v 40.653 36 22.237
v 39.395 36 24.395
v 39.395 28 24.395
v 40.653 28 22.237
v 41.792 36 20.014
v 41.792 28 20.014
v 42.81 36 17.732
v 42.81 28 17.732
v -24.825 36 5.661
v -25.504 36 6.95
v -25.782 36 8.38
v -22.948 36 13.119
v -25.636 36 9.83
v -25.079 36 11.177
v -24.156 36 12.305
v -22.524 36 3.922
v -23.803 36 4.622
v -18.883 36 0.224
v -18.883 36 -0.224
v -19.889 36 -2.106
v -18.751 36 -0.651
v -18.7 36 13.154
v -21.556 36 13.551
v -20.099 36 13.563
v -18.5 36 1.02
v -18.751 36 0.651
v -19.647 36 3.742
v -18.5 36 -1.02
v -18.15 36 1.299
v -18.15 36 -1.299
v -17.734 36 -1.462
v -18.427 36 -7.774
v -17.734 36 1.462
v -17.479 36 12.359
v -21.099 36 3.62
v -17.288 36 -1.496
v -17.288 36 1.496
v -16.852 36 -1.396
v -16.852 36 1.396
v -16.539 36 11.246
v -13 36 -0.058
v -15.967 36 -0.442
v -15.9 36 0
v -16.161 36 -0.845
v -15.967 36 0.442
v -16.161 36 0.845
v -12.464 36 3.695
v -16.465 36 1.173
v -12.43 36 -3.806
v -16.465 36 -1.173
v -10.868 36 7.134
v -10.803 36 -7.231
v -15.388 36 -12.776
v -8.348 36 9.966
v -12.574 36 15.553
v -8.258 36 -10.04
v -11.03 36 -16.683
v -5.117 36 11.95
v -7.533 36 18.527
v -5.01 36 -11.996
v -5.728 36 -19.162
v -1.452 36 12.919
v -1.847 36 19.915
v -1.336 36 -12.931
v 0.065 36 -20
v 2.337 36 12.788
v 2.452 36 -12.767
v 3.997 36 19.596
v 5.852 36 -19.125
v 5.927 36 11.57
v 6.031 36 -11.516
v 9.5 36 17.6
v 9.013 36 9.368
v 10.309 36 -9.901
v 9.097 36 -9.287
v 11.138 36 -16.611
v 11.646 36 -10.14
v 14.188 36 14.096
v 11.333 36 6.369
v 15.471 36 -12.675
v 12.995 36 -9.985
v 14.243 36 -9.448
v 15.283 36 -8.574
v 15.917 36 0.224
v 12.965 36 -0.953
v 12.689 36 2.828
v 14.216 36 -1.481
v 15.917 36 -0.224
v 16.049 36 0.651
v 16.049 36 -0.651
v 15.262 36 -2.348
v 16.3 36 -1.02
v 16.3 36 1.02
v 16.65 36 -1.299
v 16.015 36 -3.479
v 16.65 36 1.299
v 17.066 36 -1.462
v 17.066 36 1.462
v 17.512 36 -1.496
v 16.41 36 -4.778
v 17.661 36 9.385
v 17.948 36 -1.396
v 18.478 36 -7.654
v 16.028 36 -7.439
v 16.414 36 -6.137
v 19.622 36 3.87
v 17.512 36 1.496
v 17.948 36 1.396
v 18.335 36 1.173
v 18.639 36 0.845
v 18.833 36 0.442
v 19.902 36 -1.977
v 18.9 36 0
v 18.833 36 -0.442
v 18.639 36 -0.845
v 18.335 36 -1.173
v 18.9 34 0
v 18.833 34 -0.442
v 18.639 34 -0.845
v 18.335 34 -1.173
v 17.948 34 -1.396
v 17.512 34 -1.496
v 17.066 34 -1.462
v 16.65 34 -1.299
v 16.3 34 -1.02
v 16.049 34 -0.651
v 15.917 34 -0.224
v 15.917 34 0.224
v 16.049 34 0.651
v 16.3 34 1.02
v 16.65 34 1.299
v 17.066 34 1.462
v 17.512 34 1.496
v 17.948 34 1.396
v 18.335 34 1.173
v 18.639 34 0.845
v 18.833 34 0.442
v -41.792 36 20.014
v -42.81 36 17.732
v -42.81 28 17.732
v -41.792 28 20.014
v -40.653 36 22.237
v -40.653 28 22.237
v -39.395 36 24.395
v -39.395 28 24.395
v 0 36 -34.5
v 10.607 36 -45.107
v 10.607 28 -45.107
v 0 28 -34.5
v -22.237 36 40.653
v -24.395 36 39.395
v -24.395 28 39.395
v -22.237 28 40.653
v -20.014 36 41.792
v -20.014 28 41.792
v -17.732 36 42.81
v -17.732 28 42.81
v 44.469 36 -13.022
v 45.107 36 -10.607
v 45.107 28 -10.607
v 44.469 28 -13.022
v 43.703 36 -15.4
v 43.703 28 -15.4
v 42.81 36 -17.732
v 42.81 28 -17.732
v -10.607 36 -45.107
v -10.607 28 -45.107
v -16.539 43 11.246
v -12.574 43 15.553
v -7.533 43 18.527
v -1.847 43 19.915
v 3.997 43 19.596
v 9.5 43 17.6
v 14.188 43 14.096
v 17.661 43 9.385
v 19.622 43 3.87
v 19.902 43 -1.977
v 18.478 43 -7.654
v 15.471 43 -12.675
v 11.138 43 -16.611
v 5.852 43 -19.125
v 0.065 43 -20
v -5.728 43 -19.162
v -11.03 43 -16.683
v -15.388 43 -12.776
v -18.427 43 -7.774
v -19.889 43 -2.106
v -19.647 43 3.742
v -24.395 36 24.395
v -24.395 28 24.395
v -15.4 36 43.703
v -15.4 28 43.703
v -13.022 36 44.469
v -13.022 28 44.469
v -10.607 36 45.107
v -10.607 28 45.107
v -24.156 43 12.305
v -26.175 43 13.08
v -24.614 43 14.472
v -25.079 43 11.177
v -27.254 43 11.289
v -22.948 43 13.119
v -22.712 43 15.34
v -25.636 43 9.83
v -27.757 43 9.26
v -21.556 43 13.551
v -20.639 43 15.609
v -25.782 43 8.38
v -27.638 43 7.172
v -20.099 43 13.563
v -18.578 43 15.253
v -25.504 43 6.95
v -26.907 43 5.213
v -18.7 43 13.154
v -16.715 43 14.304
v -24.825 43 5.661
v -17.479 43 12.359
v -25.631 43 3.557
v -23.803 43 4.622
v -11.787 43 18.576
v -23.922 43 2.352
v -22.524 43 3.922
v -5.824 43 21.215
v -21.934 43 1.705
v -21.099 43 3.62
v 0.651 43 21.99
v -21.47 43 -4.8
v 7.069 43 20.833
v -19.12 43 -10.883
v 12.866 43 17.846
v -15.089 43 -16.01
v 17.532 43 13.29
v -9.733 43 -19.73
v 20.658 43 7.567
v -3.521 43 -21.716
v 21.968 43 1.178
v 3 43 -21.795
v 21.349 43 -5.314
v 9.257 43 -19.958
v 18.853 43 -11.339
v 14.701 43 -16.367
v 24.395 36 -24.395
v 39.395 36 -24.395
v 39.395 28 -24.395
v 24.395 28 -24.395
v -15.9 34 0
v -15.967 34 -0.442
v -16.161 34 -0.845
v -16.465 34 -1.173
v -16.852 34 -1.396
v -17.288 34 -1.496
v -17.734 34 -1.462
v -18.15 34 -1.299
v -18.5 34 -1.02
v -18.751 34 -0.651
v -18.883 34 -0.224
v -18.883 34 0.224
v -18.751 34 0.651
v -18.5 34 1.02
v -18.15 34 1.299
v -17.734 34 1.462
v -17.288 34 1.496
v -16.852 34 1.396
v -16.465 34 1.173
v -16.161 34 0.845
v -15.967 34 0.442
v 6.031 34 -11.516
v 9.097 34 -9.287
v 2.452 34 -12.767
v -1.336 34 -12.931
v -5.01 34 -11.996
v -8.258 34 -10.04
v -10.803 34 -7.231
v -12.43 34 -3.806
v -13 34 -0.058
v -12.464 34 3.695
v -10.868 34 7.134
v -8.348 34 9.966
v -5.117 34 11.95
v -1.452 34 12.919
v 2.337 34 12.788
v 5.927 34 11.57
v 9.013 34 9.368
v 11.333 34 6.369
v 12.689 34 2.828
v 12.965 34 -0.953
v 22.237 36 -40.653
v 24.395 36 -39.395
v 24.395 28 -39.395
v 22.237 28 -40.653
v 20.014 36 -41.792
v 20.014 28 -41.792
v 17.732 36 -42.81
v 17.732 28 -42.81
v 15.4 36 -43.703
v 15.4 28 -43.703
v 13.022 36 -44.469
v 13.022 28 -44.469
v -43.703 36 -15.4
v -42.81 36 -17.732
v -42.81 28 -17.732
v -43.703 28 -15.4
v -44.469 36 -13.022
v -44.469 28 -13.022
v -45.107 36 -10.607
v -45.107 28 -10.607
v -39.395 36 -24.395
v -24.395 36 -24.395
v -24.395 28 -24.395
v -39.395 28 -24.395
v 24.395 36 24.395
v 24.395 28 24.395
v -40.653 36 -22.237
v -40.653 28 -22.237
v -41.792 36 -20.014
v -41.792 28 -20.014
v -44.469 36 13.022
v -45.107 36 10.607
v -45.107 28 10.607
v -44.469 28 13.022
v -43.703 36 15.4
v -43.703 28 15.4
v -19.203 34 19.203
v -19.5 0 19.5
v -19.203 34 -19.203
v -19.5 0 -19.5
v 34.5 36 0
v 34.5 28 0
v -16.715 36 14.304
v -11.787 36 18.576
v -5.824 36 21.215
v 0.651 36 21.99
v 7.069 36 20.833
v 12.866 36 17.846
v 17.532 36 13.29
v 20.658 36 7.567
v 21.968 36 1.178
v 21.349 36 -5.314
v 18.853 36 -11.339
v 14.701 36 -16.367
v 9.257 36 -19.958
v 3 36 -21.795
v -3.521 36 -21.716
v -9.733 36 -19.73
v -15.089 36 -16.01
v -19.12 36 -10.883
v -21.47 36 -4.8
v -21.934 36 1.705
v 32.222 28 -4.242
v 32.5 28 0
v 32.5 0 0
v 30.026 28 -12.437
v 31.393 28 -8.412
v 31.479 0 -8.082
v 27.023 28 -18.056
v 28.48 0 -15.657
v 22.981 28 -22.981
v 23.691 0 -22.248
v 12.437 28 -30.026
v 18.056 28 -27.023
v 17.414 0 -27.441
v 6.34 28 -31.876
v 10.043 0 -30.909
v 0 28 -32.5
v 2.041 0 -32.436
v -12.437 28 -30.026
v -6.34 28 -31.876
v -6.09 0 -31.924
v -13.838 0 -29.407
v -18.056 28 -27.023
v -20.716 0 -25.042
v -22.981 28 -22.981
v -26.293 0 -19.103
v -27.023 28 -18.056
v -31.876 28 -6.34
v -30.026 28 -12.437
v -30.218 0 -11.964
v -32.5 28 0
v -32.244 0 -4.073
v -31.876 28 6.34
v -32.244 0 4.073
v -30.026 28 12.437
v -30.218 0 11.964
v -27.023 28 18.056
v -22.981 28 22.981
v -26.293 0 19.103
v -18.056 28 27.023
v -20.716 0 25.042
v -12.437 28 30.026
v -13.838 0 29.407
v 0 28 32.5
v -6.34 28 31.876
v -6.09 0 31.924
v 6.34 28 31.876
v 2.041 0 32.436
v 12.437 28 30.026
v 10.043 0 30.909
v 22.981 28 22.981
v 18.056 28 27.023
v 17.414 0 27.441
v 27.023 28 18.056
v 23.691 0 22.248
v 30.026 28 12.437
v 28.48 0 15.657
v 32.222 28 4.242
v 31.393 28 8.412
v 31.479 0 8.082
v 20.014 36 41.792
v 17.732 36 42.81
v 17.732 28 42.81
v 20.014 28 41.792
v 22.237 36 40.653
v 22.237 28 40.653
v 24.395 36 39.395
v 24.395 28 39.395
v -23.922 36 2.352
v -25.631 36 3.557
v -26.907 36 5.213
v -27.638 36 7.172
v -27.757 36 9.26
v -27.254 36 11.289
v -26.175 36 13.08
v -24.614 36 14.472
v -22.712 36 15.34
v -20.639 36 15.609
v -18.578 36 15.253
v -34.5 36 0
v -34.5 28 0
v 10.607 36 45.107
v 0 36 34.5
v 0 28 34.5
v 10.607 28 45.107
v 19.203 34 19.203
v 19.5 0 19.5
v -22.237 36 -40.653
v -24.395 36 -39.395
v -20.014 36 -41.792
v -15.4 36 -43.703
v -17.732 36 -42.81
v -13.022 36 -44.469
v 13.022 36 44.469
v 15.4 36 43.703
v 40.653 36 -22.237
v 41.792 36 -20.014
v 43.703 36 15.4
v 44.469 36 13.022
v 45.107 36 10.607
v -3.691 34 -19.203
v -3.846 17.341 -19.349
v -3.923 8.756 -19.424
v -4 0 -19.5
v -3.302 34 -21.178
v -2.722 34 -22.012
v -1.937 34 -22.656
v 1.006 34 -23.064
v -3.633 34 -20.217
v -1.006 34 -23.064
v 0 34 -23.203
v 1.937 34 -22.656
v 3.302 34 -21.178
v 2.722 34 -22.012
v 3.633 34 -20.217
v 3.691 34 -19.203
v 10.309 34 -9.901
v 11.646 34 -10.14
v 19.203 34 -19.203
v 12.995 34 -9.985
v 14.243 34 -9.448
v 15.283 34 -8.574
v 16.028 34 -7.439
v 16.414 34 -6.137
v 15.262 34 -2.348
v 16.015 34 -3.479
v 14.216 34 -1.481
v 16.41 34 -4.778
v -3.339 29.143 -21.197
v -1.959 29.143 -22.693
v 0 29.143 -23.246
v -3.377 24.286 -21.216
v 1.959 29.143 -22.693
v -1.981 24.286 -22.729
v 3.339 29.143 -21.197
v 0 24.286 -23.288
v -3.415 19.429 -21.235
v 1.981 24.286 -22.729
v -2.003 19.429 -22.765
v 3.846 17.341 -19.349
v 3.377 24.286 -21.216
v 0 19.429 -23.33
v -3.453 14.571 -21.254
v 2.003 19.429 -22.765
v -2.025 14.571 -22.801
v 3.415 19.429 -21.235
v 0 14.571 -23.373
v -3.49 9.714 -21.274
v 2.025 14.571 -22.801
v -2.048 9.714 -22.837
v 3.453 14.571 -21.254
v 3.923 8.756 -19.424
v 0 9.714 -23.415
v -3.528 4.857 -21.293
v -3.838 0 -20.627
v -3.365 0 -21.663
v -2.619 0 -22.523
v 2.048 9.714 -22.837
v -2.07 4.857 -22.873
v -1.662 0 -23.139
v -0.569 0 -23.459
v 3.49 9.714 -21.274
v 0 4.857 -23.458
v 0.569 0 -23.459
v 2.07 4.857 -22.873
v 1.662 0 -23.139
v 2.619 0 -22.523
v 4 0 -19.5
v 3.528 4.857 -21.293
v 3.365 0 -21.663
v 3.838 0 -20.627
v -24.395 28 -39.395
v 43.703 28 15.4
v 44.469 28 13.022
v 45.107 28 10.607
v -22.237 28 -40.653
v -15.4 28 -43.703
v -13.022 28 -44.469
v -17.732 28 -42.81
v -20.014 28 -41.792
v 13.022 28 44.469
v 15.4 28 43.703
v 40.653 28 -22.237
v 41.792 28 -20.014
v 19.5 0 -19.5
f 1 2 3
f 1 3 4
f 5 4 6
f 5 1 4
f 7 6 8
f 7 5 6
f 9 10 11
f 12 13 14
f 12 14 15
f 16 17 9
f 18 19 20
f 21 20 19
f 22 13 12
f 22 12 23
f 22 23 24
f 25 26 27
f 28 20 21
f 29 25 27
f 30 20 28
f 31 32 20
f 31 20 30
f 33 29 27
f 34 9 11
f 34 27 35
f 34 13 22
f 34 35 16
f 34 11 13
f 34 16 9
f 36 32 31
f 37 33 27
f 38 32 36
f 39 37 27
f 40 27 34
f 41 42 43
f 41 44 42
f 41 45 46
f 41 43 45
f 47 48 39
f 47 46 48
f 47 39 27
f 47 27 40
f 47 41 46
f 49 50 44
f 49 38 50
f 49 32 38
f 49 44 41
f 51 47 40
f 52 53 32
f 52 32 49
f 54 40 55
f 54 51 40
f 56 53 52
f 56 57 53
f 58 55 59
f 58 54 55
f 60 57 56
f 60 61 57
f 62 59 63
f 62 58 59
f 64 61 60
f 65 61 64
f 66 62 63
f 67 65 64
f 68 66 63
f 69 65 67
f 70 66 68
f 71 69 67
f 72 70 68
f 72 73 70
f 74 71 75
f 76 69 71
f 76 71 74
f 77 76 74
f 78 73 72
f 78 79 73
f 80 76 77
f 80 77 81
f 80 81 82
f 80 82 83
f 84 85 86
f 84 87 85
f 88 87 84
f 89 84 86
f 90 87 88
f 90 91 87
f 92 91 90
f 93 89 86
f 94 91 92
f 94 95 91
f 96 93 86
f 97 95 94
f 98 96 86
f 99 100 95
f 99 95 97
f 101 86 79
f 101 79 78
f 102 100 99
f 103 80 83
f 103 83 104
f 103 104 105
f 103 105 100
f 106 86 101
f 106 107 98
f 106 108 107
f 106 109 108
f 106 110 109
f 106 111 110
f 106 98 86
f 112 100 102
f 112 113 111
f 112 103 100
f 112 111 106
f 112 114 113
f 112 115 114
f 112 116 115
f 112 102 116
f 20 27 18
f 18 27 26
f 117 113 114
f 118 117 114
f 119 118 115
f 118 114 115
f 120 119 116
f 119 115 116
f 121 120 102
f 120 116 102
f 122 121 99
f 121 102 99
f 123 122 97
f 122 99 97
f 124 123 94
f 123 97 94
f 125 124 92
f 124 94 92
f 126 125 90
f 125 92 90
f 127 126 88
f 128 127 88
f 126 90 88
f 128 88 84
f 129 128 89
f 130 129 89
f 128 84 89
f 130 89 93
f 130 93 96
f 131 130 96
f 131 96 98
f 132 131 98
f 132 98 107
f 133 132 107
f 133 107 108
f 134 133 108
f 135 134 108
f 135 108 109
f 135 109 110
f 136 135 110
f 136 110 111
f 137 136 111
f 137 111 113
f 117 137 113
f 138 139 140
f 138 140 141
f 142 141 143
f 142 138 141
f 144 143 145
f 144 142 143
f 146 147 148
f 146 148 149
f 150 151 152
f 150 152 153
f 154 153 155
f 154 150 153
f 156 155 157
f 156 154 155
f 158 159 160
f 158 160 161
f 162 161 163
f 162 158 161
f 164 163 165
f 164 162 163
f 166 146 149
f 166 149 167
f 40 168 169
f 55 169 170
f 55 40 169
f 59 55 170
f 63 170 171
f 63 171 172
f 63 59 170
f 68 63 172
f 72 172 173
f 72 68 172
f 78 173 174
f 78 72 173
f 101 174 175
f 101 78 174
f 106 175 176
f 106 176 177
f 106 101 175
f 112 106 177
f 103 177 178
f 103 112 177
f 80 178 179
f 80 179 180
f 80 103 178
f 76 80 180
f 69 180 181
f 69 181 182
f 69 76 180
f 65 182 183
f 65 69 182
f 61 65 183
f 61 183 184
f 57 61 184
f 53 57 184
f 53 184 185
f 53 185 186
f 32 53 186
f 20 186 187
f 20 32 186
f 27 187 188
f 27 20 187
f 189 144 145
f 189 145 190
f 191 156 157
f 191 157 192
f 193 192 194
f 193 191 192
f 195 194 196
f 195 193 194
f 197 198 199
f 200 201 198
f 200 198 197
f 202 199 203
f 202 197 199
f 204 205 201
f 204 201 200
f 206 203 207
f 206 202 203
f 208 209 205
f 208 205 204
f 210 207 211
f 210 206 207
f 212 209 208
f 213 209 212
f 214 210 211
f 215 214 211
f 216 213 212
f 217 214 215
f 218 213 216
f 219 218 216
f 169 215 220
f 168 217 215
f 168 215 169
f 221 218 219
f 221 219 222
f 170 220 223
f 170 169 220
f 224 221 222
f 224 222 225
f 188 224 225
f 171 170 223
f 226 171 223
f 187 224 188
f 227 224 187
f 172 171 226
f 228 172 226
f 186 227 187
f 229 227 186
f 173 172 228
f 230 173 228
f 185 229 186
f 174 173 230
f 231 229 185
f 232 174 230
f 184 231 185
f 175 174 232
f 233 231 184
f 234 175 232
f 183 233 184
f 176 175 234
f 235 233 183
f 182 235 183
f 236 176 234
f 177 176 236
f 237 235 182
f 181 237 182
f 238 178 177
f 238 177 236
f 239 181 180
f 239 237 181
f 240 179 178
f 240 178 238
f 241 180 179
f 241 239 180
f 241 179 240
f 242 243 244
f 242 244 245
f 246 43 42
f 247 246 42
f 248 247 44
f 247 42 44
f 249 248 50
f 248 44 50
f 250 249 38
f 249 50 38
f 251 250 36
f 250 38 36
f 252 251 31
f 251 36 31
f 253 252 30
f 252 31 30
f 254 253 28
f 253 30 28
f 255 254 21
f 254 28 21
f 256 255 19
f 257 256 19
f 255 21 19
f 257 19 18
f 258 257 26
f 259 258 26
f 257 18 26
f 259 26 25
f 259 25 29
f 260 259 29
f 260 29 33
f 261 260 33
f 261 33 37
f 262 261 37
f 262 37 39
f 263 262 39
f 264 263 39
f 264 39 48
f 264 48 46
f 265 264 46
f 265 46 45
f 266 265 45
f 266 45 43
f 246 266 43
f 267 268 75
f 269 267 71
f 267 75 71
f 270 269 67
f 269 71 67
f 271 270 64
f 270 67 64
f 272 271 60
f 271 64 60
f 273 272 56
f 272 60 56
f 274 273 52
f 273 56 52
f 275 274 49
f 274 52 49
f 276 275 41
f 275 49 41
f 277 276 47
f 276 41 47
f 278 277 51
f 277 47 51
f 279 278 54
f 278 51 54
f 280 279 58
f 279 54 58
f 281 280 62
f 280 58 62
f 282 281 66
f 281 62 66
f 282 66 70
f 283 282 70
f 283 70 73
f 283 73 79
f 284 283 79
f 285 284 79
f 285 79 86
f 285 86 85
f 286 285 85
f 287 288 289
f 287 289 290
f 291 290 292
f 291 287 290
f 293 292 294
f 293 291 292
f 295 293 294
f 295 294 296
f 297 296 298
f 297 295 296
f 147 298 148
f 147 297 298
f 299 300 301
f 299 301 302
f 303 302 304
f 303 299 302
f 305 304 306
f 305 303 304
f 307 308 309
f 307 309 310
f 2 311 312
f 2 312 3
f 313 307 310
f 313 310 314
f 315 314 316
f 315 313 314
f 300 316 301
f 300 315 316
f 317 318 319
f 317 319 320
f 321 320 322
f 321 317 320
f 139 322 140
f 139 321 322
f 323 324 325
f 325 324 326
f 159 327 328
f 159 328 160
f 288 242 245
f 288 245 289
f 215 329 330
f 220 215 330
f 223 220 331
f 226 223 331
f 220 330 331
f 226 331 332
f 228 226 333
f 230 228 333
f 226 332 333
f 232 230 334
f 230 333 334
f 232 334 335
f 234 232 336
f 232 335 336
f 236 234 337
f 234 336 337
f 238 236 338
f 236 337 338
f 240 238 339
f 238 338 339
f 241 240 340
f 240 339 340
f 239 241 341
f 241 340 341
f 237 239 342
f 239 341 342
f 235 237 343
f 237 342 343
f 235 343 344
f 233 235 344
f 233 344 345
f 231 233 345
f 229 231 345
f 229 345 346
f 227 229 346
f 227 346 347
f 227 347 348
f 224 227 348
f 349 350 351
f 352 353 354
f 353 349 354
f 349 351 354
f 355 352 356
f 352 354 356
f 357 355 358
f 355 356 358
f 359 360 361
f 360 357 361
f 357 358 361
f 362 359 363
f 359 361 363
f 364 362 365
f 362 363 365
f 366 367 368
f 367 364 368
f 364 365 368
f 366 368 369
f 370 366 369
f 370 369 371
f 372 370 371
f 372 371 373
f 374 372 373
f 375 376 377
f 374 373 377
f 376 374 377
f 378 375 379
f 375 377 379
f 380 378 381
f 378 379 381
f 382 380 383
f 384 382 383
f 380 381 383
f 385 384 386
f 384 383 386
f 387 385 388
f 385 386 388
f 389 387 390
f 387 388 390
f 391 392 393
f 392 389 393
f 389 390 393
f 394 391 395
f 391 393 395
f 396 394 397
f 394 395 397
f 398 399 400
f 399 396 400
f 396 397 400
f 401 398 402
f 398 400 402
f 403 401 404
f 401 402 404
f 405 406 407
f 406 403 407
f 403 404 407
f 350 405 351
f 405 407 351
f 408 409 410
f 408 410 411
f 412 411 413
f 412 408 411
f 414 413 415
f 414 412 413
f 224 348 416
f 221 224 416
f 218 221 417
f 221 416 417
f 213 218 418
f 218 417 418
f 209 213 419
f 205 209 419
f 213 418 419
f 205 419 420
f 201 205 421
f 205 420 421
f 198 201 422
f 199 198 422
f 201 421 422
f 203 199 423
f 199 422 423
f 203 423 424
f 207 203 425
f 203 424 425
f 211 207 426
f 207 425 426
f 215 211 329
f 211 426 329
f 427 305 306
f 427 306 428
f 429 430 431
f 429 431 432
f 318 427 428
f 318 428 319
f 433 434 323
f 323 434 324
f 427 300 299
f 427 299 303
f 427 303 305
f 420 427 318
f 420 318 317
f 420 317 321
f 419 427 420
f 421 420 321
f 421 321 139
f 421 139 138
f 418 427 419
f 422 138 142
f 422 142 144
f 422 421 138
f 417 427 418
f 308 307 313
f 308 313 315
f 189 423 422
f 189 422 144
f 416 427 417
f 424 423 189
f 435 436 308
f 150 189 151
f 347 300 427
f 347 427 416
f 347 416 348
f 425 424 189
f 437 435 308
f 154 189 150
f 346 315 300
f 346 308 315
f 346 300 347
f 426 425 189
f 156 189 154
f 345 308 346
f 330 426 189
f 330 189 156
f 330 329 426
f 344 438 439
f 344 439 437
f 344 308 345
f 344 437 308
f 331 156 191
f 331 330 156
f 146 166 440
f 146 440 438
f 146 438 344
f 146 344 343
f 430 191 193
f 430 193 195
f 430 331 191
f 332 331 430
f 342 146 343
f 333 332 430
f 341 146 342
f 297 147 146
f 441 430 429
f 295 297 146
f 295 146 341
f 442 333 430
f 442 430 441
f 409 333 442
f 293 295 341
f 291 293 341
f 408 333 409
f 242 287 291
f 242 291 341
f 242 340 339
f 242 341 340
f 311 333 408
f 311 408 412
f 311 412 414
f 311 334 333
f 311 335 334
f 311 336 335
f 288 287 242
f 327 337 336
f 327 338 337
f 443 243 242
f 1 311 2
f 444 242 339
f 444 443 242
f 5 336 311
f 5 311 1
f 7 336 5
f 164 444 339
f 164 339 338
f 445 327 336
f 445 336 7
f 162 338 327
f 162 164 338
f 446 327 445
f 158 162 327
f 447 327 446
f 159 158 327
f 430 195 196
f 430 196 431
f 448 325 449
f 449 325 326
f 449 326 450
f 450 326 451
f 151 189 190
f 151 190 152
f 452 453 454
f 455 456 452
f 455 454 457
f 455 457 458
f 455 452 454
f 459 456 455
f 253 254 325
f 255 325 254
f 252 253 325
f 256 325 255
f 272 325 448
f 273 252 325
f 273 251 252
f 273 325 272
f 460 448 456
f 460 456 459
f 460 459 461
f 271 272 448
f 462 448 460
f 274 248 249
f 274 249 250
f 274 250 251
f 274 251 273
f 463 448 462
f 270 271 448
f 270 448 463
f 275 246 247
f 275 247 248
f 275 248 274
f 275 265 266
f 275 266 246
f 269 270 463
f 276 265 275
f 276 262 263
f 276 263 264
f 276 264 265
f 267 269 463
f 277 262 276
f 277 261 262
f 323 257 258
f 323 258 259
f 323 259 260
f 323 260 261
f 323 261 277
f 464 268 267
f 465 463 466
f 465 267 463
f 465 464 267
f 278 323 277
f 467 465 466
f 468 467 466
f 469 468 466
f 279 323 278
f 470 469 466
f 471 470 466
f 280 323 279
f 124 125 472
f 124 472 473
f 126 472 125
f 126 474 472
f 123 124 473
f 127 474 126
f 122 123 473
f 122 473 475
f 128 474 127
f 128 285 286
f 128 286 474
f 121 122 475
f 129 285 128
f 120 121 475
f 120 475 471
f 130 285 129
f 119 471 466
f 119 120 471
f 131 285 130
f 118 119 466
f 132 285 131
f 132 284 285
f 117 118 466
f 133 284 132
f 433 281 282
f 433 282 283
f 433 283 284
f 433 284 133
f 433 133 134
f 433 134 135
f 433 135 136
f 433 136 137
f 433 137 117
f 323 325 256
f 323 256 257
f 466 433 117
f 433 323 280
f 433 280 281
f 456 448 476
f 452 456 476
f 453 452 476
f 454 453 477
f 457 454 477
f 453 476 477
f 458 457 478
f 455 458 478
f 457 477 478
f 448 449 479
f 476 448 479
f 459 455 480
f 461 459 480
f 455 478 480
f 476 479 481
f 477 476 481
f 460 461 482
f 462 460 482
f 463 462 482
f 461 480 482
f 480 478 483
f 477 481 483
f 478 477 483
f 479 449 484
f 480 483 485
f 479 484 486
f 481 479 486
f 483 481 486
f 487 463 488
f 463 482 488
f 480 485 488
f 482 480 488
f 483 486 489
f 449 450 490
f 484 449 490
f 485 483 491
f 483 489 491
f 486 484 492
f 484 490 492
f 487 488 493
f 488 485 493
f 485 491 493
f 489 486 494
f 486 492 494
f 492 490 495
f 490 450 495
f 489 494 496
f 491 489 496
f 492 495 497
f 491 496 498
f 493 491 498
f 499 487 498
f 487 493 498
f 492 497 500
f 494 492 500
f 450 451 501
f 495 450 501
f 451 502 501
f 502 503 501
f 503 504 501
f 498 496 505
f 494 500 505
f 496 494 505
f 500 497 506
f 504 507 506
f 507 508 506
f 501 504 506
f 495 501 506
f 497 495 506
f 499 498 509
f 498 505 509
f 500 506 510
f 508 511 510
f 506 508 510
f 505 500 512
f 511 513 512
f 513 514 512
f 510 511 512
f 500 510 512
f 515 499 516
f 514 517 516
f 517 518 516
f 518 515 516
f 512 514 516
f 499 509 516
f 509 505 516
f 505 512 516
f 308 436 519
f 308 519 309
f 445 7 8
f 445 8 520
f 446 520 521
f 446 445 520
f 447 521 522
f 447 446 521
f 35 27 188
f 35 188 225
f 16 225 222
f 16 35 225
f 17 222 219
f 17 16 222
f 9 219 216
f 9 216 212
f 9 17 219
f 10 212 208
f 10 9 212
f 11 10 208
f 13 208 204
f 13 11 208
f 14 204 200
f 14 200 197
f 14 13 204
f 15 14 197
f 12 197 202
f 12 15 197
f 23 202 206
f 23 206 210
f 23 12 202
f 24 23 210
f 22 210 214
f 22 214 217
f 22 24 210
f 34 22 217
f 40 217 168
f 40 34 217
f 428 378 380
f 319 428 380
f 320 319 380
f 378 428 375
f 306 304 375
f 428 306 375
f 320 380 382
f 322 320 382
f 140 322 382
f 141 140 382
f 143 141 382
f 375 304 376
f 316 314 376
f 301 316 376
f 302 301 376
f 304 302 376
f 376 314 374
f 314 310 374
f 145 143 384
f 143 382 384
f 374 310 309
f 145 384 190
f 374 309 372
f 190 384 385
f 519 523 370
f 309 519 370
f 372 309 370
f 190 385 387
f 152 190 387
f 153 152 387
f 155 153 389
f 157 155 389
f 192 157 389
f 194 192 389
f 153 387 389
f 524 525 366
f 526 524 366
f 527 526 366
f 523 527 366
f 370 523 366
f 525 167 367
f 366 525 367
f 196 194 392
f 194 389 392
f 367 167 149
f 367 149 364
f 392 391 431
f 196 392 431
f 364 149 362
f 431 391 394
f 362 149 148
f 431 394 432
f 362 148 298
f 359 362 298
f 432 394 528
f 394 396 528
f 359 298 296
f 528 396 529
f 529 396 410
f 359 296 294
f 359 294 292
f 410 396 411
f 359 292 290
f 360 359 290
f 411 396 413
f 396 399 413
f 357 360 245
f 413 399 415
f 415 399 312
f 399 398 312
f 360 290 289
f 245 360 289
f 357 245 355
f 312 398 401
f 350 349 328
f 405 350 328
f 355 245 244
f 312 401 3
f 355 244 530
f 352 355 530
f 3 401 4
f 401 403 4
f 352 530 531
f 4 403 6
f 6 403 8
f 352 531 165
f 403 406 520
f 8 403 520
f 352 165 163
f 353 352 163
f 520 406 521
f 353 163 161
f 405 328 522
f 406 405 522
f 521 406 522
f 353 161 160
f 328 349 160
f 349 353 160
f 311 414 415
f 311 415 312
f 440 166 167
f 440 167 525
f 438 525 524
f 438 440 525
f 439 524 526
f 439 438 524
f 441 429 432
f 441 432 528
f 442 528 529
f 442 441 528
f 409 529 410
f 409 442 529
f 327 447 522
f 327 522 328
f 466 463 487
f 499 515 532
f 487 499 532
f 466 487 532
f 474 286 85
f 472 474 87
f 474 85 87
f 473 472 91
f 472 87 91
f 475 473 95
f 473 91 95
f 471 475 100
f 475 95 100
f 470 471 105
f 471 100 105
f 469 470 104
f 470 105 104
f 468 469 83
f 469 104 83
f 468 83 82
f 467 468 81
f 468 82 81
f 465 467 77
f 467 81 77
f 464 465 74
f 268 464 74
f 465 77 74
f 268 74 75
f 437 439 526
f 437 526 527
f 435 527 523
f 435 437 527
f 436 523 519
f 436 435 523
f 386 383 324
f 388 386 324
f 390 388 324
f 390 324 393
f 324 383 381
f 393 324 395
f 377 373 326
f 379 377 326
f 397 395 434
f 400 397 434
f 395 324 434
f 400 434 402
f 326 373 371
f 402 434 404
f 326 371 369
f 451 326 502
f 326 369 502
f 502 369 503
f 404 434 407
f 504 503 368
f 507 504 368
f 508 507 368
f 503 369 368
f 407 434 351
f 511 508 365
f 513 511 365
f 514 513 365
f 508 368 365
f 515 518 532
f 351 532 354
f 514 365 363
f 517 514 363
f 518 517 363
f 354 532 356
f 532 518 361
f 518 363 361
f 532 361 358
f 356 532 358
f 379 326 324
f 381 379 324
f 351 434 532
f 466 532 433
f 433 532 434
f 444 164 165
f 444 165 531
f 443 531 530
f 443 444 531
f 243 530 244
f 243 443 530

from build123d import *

# Parameters (mm, degrees)
SKETCH3_R           = 1.5
CUT_EXTRUDE1_DEPTH  = 20
BOSS_EXTRUDE2_START = 36
BOSS_EXTRUDE2_DEPTH = 8
CIRPATTERN1_COUNT   = 8
SKETCH5_R           = 4.669864721
CUT_EXTRUDE2_DEPTH  = 37
CUT_EXTRUDE4_DEPTH  = 34
CUT_EXTRUDE4_DRAFT  = -0.5
BOSS_EXTRUDE3_DEPTH = 7


with BuildPart() as part:
    # Sketch2 → Revolve1 (revolve)
    with BuildSketch(Plane.XY):
        Polygon((13, 0), (13, 36), (22.5, 36), (32.5, 36), (32.5, 0), align=None)
    revolve(axis=Axis((0, 0, 0), (0, 1, 0)))

    # Sketch3 → Cut-Extrude1 (cut)
    with BuildSketch(Plane(origin=(0, 36, 0), x_dir=(1, 0, 0), z_dir=(0, 1, 0))):
        with Locations((-17.4, 0)):
            Circle(SKETCH3_R)
        with Locations((17.4, 0)):
            Circle(SKETCH3_R)
    extrude(amount=-CUT_EXTRUDE1_DEPTH, mode=Mode.SUBTRACT)

    # Sketch4 → Boss-Extrude2 (add)
    with BuildSketch(Plane(origin=(0, 0, 0), x_dir=(1, 0, 0), z_dir=(0, 1, 0)).offset(BOSS_EXTRUDE2_START)):
        with BuildLine():
            Line((0, 34.5), (-10.606601718, 45.106601718))
            ThreePointArc((-10.606601718, 45.106601718), (-14.215943039, 44.102295655), (-17.732352445, 42.809685765))
            Line((-17.732352445, 42.809685765), (-12.437211552, 30.026084807))
            ThreePointArc((-12.437211552, 30.026084807), (0, 32.5), (12.437211552, 30.026084807))
            Line((12.437211552, 30.026084807), (17.732352445, 42.809685765))
            ThreePointArc((17.732352445, 42.809685765), (14.215943039, 44.102295655), (10.606601718, 45.106601718))
            Line((10.606601718, 45.106601718), (0, 34.5))
        make_face()
    boss_extrude2 = extrude(amount=-BOSS_EXTRUDE2_DEPTH)

    # CirPattern1: Boss-Extrude2 ×8 about axis
    cirpattern1_axis = Axis((0, 0, 0), (0, 1, 0))
    for i in range(1, CIRPATTERN1_COUNT):
        add(boss_extrude2.rotate(cirpattern1_axis, i * 360 / CIRPATTERN1_COUNT))

    # Sketch5 → Cut-Extrude2 (cut, through all)
    with BuildSketch(Plane(origin=(0, 36, 0), x_dir=(1, 0, 0), z_dir=(0, 1, 0))):
        with Locations((11.791900395, 5.472758453)):
            Circle(SKETCH5_R)
    extrude(amount=-CUT_EXTRUDE2_DEPTH, mode=Mode.SUBTRACT)


with BuildPart() as cut_extrude4_tool:
    # Sketch8 → Cut-Extrude4 (with draft: the straight prism first)
    with BuildSketch(Plane.XZ):
        with BuildLine():
            Line((-19.5, 19.5), (-19.5, -19.5))
            Line((-19.5, -19.5), (-4, -19.5))
            ThreePointArc((-4, -19.5), (0, -23.5), (4, -19.5))
            Line((4, -19.5), (19.5, -19.5))
            Line((19.5, -19.5), (19.5, 19.5))
            Line((19.5, 19.5), (-19.5, 19.5))
        make_face()
    extrude(amount=-CUT_EXTRUDE4_DEPTH)
    # Cut-Extrude4: the draft: its side faces are tilted about the plane it starts from
    cut_extrude4_sides = [cut_extrude4_tool.faces().sort_by_distance(p)[0] for p in [
        (-19.5, 17, 0),
        (-11.75, 17, -19.5),
        (0, 17, -23.5),
        (11.75, 17, -19.5),
        (19.5, 17, 0),
        (0, 17, 19.5),
    ]]
    draft(cut_extrude4_sides, Plane.XZ, CUT_EXTRUDE4_DRAFT)


with BuildPart() as part_1:
    add(part.part)

    # Cut-Extrude4: cut by cut_extrude4_tool
    add(cut_extrude4_tool.part, mode=Mode.SUBTRACT)

    # Sketch9 → Boss-Extrude3 (add)
    with BuildSketch(Plane(origin=(0, 36, 0), x_dir=(1, 0, 0), z_dir=(0, 1, 0))):
        with BuildLine():
            ThreePointArc((-16.715121997, -14.30400981), (20.325349715, 8.419035512), (-21.933838447, -1.704913777))
            ThreePointArc((-21.933838447, -1.704913777), (-27.254446209, -11.289161255), (-16.715121997, -14.30400981))
        make_face()
        with BuildLine():
            ThreePointArc((-19.646781143, -3.742190633), (-25.406687144, -10.52379439), (-16.538500547, -11.246243802))
            ThreePointArc((-16.538500547, -11.246243802), (18.47759065, 7.653668647), (-19.646781143, -3.742190633))
        make_face(mode=Mode.SUBTRACT)
    extrude(amount=BOSS_EXTRUDE3_DEPTH)


solid = part_1.part
